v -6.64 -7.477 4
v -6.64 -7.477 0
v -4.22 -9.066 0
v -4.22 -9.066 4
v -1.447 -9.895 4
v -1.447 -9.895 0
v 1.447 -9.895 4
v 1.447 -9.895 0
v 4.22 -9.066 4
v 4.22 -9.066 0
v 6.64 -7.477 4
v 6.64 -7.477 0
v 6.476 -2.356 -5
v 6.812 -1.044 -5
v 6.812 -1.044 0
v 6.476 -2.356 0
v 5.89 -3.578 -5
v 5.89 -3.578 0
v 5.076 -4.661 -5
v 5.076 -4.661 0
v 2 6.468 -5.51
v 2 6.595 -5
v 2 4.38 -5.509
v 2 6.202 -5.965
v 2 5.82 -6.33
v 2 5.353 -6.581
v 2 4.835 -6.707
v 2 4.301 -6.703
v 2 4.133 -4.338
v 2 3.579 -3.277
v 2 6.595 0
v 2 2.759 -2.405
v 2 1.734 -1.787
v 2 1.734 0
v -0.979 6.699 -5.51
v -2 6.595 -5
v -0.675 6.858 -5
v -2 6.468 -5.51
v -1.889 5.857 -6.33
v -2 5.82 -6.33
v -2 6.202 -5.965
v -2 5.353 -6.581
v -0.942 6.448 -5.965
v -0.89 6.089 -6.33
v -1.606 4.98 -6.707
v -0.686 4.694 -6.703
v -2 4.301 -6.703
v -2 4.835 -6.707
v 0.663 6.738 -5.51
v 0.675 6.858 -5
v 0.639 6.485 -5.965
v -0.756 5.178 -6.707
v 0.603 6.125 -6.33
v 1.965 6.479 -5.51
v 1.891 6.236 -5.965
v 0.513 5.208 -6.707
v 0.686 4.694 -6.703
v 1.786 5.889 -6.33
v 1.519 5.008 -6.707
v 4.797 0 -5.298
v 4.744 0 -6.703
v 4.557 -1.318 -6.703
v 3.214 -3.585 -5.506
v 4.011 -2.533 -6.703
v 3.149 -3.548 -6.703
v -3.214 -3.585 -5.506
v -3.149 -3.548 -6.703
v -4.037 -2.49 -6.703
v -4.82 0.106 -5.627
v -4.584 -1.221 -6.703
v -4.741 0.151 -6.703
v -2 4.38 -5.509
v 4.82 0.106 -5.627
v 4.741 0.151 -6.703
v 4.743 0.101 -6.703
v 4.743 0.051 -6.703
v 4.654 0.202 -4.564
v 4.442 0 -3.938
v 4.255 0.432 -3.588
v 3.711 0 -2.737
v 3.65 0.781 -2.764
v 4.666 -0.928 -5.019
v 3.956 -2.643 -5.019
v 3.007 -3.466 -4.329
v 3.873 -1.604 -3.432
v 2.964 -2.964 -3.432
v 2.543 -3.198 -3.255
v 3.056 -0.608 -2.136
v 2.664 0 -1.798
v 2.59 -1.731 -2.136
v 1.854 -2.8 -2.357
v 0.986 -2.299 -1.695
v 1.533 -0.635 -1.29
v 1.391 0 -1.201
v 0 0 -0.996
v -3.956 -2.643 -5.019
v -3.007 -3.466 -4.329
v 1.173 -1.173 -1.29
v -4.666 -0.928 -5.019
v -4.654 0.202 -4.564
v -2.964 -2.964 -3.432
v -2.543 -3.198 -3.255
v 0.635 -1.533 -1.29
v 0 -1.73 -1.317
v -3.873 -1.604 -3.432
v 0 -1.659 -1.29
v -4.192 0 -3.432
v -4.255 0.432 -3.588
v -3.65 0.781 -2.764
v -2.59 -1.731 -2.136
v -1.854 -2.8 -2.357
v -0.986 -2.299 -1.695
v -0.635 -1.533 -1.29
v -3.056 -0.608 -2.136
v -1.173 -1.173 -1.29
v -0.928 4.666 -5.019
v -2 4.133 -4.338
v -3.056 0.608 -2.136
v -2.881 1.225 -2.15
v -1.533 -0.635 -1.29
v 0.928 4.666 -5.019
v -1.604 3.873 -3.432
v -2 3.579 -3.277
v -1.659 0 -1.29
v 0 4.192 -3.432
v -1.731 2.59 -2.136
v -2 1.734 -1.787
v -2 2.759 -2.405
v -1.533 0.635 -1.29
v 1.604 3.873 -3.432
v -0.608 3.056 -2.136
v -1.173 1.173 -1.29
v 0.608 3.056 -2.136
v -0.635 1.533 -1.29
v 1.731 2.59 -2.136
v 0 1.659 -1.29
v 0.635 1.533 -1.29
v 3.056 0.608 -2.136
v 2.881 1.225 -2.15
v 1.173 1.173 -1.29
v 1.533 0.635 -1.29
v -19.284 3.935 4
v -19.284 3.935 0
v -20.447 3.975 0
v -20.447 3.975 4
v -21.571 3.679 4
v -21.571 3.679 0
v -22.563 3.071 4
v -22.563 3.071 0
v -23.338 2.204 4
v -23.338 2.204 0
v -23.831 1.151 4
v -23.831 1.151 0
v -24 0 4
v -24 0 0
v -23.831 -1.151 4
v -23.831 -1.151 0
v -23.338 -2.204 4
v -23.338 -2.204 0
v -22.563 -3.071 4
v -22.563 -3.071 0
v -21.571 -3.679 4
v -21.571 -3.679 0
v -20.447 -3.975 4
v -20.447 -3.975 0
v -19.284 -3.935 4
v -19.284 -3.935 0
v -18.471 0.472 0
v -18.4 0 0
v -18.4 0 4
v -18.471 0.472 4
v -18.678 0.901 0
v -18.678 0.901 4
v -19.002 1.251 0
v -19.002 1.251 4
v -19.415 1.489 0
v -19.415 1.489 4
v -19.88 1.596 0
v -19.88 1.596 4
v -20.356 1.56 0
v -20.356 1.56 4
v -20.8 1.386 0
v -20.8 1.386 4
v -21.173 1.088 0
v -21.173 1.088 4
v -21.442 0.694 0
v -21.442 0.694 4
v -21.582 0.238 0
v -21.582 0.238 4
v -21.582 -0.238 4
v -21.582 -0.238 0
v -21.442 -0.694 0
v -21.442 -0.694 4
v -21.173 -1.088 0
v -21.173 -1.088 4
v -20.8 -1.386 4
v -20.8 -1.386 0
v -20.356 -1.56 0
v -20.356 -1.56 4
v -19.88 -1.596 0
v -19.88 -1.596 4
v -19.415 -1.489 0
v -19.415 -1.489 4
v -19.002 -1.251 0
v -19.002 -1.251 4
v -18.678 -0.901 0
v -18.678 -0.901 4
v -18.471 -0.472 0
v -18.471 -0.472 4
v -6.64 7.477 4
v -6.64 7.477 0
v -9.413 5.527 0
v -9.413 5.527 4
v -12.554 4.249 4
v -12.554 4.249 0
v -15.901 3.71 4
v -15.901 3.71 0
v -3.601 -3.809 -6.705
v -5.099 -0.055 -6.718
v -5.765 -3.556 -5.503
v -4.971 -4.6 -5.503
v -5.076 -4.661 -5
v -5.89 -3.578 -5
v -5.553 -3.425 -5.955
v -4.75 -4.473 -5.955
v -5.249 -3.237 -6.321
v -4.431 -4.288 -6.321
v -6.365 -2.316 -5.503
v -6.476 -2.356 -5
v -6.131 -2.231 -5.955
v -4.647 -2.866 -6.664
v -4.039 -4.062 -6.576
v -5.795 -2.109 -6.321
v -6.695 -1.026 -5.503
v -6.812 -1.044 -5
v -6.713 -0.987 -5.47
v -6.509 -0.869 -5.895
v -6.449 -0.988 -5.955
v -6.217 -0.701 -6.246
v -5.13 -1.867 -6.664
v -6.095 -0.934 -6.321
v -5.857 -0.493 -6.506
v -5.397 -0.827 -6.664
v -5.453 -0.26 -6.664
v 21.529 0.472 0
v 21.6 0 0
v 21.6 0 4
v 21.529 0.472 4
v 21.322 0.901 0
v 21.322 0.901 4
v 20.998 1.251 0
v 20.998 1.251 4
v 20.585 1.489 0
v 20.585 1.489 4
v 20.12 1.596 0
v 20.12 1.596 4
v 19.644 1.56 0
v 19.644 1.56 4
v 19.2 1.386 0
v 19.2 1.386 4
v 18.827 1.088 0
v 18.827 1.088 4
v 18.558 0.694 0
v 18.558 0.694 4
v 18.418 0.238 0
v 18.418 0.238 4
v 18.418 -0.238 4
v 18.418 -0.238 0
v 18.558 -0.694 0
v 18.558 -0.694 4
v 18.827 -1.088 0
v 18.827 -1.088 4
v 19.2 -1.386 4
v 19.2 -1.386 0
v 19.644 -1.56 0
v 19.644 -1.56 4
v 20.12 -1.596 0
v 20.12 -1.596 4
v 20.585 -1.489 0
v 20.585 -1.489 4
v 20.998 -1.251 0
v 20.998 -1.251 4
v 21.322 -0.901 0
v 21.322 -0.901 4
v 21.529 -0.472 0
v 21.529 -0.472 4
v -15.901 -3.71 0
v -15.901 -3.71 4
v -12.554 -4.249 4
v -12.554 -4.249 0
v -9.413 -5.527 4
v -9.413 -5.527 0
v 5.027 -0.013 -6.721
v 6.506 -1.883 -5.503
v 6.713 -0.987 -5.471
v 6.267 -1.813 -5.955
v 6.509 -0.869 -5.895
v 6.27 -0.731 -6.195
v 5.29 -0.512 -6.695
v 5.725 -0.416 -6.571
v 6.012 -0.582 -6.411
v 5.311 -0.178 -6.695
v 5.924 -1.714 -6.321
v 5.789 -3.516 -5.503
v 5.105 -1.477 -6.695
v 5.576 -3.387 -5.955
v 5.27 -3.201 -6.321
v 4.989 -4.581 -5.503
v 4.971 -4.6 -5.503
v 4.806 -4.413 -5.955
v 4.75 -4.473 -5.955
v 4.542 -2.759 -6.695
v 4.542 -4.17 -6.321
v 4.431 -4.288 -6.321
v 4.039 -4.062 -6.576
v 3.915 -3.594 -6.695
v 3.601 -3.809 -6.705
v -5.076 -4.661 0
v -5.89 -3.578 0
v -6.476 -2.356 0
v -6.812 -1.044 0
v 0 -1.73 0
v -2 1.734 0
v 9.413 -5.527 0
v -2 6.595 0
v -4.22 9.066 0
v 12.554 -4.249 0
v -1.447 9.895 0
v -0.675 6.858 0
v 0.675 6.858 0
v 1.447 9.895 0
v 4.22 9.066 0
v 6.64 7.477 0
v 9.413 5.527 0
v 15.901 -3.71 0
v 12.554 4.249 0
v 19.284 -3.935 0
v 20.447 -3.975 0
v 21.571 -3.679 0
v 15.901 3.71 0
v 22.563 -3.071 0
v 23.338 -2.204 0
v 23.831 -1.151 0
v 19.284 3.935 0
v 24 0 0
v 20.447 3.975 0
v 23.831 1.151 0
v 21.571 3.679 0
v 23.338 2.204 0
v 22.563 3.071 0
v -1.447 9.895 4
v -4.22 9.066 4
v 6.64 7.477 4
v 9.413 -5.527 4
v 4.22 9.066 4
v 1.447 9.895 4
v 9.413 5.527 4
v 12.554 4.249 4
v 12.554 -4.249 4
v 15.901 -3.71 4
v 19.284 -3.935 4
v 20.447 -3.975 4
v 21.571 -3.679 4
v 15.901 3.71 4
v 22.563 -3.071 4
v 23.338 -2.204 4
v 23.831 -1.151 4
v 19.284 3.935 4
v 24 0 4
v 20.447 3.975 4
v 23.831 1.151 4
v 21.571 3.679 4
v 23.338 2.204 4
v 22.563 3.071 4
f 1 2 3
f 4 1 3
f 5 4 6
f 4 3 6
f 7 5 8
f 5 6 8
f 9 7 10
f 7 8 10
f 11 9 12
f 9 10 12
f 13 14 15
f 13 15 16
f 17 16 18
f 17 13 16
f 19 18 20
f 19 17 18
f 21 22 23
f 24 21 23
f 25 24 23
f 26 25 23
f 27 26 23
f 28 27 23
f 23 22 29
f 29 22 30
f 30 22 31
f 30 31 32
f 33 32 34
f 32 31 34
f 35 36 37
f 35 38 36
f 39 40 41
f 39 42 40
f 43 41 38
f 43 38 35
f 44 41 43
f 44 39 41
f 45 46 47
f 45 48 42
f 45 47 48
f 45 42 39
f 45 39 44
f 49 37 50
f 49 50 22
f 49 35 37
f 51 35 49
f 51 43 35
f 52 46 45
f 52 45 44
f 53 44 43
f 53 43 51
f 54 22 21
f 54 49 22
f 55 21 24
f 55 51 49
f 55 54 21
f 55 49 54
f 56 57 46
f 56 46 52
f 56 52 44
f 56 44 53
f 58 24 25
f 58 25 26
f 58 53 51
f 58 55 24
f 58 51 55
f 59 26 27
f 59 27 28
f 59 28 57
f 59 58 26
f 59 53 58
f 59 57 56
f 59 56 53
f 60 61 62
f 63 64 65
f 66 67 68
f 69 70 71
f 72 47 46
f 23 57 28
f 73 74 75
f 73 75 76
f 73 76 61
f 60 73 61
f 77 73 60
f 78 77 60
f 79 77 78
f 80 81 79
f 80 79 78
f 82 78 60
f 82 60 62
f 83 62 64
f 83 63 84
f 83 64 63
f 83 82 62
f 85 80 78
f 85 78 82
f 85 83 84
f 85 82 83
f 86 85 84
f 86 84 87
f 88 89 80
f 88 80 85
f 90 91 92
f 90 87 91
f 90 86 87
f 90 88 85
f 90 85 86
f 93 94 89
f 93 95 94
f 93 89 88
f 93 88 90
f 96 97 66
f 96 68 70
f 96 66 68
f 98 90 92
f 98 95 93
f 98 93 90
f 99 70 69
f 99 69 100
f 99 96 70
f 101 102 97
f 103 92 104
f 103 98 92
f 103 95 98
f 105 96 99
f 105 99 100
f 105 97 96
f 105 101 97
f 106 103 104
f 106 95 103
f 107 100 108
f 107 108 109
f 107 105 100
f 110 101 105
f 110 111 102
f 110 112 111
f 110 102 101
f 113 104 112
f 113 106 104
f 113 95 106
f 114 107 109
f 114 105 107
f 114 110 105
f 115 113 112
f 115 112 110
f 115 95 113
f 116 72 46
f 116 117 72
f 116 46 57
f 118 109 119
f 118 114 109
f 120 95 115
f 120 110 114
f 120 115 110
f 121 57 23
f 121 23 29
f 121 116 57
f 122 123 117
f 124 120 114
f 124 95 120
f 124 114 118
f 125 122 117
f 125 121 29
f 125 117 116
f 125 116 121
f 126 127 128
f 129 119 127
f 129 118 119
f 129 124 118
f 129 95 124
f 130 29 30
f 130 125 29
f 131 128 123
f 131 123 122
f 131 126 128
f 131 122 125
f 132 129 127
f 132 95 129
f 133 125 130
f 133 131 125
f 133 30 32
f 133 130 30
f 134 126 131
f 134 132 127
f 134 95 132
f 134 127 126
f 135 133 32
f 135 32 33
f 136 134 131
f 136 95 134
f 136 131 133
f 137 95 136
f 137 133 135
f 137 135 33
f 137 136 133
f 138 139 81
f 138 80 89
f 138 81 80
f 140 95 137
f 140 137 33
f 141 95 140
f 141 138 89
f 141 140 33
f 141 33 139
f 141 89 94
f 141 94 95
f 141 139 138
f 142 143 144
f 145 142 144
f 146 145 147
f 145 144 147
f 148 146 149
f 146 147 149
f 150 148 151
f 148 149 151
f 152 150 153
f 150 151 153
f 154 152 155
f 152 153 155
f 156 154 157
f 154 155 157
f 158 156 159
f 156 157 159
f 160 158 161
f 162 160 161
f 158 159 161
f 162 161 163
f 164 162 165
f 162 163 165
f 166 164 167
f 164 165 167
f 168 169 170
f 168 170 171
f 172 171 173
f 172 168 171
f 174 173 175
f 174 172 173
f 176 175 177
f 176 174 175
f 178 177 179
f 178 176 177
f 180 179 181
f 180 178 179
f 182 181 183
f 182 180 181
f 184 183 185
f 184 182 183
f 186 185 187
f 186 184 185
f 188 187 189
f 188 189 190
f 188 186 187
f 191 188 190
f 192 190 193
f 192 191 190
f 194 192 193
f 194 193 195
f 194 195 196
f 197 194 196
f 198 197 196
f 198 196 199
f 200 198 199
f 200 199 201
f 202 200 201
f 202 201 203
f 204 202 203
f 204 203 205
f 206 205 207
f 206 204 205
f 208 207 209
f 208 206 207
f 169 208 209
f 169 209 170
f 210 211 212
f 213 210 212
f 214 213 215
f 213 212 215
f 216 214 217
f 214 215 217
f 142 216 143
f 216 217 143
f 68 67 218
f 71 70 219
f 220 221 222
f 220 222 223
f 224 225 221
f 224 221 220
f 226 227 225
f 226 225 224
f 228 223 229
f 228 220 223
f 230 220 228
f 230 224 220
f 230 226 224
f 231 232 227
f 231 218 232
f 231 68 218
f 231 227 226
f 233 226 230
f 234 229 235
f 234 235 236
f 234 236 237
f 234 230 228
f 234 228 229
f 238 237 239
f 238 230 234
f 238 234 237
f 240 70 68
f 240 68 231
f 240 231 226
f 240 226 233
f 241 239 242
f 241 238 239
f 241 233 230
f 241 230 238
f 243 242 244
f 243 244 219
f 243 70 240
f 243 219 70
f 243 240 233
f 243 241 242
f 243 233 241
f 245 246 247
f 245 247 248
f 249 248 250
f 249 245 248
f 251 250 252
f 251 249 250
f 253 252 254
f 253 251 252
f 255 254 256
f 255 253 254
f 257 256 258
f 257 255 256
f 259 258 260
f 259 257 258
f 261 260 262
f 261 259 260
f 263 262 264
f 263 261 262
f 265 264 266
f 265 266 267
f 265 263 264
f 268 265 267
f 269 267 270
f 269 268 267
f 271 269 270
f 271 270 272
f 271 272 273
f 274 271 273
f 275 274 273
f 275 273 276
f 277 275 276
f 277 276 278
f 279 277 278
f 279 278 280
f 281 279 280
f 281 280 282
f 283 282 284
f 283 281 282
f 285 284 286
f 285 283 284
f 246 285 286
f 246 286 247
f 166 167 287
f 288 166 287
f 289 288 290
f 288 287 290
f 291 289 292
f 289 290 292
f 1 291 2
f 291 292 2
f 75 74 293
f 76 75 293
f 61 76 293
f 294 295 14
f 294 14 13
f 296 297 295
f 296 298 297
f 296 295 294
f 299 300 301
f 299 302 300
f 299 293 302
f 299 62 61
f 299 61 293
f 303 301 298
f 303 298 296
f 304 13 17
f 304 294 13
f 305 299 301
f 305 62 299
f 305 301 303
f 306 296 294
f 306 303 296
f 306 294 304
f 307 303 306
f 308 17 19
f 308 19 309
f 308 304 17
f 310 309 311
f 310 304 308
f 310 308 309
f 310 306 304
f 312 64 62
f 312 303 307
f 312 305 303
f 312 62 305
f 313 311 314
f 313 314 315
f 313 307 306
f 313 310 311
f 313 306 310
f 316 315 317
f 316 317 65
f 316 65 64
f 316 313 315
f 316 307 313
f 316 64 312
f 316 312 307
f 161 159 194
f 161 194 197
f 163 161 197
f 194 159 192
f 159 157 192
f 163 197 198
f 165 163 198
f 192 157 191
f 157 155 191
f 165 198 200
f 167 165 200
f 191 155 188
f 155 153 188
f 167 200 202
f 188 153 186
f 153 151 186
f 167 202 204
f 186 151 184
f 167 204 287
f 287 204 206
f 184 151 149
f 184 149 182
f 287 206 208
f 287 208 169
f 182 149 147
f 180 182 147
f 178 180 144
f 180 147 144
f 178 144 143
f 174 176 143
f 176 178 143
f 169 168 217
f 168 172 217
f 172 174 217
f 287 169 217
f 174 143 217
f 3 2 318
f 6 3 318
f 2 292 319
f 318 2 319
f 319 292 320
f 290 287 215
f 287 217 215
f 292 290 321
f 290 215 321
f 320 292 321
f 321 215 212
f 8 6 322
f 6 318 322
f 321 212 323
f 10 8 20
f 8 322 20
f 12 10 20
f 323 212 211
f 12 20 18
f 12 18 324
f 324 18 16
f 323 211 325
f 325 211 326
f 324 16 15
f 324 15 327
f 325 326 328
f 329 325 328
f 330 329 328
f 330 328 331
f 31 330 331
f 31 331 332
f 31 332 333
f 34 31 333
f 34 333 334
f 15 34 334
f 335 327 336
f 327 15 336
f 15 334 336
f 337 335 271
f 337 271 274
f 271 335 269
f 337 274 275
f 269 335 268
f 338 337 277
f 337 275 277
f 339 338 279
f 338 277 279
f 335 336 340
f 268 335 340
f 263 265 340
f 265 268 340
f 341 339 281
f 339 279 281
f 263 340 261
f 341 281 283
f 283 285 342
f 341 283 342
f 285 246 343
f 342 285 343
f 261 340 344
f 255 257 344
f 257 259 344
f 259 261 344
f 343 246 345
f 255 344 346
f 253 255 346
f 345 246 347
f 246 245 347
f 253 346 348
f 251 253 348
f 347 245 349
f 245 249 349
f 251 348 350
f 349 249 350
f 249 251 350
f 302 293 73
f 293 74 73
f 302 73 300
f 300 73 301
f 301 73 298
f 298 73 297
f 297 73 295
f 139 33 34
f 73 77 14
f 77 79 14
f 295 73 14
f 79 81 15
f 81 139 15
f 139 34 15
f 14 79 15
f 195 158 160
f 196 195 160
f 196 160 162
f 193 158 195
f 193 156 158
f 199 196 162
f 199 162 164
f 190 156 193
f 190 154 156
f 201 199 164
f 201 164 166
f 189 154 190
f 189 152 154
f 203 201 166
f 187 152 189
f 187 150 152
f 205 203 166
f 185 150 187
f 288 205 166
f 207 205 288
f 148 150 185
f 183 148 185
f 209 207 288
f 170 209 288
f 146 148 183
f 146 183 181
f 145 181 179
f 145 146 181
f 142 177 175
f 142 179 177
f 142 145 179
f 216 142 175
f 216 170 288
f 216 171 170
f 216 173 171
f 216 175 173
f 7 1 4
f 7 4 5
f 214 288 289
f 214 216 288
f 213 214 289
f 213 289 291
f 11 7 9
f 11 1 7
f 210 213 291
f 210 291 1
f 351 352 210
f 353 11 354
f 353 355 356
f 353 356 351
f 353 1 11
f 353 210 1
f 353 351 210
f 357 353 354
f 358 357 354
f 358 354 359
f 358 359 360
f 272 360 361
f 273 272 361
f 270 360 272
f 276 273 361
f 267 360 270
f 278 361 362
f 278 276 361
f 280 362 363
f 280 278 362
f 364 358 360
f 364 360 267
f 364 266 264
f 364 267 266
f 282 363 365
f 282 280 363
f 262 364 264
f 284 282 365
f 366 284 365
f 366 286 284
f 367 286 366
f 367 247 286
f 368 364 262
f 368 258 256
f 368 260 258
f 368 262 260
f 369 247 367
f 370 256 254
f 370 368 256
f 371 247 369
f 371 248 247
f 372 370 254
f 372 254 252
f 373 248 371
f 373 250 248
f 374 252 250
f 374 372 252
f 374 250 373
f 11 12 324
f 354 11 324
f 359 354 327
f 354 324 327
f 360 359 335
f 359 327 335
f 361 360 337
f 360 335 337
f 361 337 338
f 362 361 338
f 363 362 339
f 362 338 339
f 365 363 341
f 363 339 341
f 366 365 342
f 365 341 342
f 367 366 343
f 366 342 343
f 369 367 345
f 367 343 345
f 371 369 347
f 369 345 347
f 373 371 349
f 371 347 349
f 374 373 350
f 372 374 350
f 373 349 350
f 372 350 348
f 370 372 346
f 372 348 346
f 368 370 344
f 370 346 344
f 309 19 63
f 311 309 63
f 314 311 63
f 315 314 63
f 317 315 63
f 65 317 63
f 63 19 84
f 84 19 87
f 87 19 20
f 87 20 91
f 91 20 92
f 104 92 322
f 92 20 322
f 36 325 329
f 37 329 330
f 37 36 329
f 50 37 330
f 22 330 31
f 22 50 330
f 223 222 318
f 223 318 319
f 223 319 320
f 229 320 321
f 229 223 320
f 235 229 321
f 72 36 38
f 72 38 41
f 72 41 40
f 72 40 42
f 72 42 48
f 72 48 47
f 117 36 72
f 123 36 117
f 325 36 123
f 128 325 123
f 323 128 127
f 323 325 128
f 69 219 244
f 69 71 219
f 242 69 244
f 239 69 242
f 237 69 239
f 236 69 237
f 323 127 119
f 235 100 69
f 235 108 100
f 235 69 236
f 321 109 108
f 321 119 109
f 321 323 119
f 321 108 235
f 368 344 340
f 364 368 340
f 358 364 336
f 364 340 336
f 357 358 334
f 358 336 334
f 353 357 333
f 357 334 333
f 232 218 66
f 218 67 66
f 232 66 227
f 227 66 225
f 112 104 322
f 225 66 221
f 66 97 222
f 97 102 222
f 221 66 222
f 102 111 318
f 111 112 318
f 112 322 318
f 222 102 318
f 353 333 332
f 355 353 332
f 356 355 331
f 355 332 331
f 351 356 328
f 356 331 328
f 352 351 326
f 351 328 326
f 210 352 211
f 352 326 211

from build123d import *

# Parameters (mm, degrees)
CORTE_EXTRUS_O1_DEPTH    = 12.838758968
ESBO_O4_R                = 1.6
RESSALTO_EXTRUS_O1_DEPTH = 4


with BuildPart() as part:
    # Esboço1 → Revolução1 (revolve)
    with BuildSketch(Plane(origin=(0, 0, 0), x_dir=(1, 0, 0), z_dir=(0, 1, 0))):
        with BuildLine():
            Line((0, 0), (6.891534421, 0))
            Line((6.891534421, 0), (6.891534421, 5))
            ThreePointArc((6.891534421, 5), (6.180613943, 6.309516298), (4.743586175, 6.703460527))
            ThreePointArc((4.743586175, 6.703460527), (3.710745118, 2.736851933), (0, 0.995842151))
            Line((0, 0.995842151), (0, 0))
        make_face()
    revolve(axis=Axis((0, 0, 0), (0, 0, -1)))

    # Esboço3 → Corte-extrusão1 (cut, through all)
    with BuildSketch(Plane.XY):
        with BuildLine():
            Line((-2, 19.326317369), (-2, 1.734101615))
            Line((-2, 1.734101615), (-17.937282026, -7.467292453))
            ThreePointArc((-17.937282026, -7.467292453), (-16.698748021, 9.932691356), (-2, 19.326317369))
        make_face()
        with BuildLine():
            Line((2, 19.326317369), (2, 1.734101615))
            Line((2, 1.734101615), (17.937282026, -7.467292453))
            ThreePointArc((17.937282026, -7.467292453), (16.698748021, 9.932691356), (2, 19.326317369))
        make_face()
        with BuildLine():
            Line((0, -1.73), (-16.027252382, -10.983338477))
            ThreePointArc((-16.027252382, -10.983338477), (0, -19.429527607), (16.027252382, -10.983338477))
            Line((16.027252382, -10.983338477), (0, -1.73))
        make_face()
    extrude(amount=-CORTE_EXTRUS_O1_DEPTH, mode=Mode.SUBTRACT)

    # Esboço4 → Ressalto-extrusão1 (add)
    with BuildSketch(Plane.XY):
        with BuildLine():
            ThreePointArc((-6.64, -7.477325725), (0, -10), (6.64, -7.477325725))
            ThreePointArc((6.64, -7.477325725), (12.553949294, -4.249302623), (19.284210526, -3.935434592))
            ThreePointArc((19.284210526, -3.935434592), (24, 0), (19.284210526, 3.935434592))
            ThreePointArc((19.284210526, 3.935434592), (12.553949294, 4.249302623), (6.64, 7.477325725))
            ThreePointArc((6.64, 7.477325725), (0, 10), (-6.64, 7.477325725))
            ThreePointArc((-6.64, 7.477325725), (-12.553949294, 4.249302623), (-19.284210526, 3.935434592))
            ThreePointArc((-19.284210526, 3.935434592), (-24, 0), (-19.284210526, -3.935434592))
            ThreePointArc((-19.284210526, -3.935434592), (-12.553949294, -4.249302623), (-6.64, -7.477325725))
        make_face()
        with Locations((20, 0)):
            Circle(ESBO_O4_R, mode=Mode.SUBTRACT)
        with Locations((-20, 0)):
            Circle(ESBO_O4_R, mode=Mode.SUBTRACT)
    extrude(amount=RESSALTO_EXTRUS_O1_DEPTH)


solid = part.part
